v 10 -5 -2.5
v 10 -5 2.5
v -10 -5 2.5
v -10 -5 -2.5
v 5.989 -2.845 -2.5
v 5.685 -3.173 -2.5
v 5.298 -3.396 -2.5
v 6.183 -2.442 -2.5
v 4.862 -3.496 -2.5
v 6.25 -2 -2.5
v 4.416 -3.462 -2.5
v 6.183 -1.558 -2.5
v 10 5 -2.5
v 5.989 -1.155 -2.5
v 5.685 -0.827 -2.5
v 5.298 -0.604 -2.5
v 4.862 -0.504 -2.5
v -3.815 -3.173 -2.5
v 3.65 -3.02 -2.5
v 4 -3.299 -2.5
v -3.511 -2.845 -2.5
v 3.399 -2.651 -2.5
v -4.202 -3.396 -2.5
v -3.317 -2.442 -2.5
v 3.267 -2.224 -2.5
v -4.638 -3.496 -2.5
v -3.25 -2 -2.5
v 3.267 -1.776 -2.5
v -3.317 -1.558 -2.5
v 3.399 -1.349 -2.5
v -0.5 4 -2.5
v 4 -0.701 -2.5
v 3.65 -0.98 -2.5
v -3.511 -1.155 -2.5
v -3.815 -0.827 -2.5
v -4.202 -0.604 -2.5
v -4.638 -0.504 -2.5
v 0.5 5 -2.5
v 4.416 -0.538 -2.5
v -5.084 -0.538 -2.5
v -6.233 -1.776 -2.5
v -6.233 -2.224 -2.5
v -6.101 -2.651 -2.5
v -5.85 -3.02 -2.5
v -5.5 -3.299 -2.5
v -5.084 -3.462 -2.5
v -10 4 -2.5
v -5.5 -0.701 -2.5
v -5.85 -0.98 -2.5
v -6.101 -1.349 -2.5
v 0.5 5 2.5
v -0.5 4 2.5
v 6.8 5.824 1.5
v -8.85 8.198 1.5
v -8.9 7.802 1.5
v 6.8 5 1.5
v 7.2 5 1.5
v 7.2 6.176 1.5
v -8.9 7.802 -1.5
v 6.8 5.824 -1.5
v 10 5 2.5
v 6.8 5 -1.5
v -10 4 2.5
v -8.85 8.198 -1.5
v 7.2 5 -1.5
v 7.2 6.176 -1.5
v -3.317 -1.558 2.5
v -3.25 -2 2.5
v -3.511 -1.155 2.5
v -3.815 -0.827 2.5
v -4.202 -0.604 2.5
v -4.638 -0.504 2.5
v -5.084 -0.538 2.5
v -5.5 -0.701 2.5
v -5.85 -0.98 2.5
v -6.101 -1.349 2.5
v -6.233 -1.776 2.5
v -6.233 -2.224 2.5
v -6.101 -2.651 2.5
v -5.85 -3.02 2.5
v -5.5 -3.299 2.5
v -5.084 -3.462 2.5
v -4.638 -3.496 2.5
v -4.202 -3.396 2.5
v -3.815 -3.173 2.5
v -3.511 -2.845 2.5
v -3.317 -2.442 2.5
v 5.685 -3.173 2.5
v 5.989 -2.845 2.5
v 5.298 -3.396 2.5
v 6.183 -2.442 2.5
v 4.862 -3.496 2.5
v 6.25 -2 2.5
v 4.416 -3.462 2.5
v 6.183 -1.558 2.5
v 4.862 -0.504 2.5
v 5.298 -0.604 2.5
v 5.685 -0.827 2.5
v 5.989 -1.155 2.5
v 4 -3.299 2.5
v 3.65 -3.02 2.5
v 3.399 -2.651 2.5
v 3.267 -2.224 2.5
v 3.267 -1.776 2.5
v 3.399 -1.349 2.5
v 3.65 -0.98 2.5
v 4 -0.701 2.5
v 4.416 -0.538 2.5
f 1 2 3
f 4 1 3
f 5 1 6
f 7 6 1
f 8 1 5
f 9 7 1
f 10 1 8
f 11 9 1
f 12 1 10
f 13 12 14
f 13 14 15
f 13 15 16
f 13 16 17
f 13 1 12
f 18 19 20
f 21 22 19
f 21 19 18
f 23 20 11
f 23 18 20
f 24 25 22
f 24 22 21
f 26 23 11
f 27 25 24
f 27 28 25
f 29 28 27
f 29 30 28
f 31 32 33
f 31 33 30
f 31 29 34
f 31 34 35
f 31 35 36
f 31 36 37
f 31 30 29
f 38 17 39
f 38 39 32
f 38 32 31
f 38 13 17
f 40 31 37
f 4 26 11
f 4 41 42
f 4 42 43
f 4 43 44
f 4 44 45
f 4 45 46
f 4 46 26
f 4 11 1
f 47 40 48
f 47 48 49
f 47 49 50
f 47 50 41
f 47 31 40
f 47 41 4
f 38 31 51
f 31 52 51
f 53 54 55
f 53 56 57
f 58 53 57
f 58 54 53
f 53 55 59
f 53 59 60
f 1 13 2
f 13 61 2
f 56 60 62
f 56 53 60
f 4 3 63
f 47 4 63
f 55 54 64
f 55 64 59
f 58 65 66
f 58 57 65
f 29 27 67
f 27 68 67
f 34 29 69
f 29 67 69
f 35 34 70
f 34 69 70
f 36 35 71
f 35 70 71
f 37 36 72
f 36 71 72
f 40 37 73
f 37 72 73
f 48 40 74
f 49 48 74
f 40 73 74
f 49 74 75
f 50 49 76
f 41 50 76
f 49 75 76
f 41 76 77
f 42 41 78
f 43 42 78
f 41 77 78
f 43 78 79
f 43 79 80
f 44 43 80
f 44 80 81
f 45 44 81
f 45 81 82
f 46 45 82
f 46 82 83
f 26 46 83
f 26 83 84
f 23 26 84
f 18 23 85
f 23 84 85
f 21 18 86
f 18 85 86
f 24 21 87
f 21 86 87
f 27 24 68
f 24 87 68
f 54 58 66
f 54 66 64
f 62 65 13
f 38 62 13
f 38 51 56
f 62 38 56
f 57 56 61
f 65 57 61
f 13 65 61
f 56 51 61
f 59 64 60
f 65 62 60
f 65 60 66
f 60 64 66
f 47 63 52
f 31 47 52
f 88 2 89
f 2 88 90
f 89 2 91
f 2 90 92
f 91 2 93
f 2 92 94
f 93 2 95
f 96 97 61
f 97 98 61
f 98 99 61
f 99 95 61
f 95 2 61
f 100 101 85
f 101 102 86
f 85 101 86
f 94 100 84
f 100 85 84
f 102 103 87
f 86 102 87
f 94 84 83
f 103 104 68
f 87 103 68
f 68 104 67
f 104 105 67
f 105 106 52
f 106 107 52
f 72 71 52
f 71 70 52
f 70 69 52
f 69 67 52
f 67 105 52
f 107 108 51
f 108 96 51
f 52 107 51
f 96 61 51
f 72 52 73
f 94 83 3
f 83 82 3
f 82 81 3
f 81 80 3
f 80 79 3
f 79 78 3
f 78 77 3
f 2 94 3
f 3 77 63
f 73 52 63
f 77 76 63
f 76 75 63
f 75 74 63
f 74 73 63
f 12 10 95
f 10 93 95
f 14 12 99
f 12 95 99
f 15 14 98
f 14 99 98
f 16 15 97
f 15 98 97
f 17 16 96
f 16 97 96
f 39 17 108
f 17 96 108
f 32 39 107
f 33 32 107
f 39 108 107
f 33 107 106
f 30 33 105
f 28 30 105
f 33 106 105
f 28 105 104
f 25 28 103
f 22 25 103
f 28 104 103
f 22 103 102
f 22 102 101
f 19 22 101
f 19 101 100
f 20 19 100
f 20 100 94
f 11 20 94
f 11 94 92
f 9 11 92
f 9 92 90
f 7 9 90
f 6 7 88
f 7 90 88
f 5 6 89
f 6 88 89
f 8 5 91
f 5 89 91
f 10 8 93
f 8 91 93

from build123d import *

# Parameters (mm, degrees)
BOSS_EXTRUDE1_DEPTH          = 2.5
F_3_0_3_DIAMETER_HOLE1_D     = 3
F_3_0_3_DIAMETER_HOLE1_DEPTH = 5
F_3_0_3_DIAMETER_HOLE1_TIP   = 0.901290929
BOSS_EXTRUDE2_DEPTH          = 1.5


with BuildPart() as part:
    # Sketch1 → Boss-Extrude1 (new, symmetric)
    with BuildSketch(Plane.XY):
        Polygon((-10, 4), (-0.5, 4), (0.5, 5), (10, 5), (10, -5), (-10, -5), align=None)
    extrude(amount=BOSS_EXTRUDE1_DEPTH, both=True)

    # Ø3.0 (3) Diameter Hole1
    with Locations(Plane(origin=(0, 0, -2.5), x_dir=(-1, 0, 0), z_dir=(0, 0, -1))):
        with Locations((-4.75, -2), (4.75, -2)):
            Hole(F_3_0_3_DIAMETER_HOLE1_D / 2, depth=F_3_0_3_DIAMETER_HOLE1_DEPTH)
            with Locations((0, 0, -(F_3_0_3_DIAMETER_HOLE1_DEPTH + F_3_0_3_DIAMETER_HOLE1_TIP / 2))):  # 118° drill point
                Cone(0, F_3_0_3_DIAMETER_HOLE1_D / 2, F_3_0_3_DIAMETER_HOLE1_TIP, mode=Mode.SUBTRACT)

    # Sketch5 → Boss-Extrude2 (add, symmetric)
    with BuildSketch(Plane.XY):
        Polygon((7.2, 5), (7.2, 6.176383421), (-8.849507866, 8.198431348), (-8.899507866, 7.801568652), (6.8, 5.823616579), (6.8, 5), align=None)
    extrude(amount=BOSS_EXTRUDE2_DEPTH, both=True)


solid = part.part
